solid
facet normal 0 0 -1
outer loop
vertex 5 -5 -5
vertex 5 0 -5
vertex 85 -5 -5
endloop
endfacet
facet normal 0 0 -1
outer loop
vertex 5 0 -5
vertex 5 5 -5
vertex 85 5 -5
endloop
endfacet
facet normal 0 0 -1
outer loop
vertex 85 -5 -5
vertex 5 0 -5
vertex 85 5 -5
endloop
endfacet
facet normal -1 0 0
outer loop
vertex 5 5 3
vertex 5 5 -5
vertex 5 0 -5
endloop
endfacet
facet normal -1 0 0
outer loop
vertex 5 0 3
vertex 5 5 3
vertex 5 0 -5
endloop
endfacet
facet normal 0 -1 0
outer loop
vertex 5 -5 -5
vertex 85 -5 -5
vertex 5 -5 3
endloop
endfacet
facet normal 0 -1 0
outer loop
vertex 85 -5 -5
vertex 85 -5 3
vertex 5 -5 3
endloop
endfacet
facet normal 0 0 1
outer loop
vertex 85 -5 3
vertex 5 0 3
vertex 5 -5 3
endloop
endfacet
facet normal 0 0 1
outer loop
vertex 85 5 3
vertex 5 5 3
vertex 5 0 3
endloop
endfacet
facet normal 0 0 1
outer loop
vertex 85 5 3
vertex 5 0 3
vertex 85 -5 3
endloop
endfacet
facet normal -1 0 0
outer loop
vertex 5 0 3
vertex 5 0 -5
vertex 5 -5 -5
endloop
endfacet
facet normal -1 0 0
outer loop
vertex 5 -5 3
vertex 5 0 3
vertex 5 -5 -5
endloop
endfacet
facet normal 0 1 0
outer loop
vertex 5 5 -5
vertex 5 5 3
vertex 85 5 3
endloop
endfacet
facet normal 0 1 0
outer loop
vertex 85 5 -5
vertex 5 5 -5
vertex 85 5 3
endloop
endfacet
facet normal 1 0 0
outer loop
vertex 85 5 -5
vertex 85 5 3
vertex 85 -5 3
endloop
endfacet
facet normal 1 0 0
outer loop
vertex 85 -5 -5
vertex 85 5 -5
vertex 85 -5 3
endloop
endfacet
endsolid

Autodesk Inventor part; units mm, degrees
ref_plane "YZ Plane" through (0, 0, 0) normal (1, 0, 0) x (0, 1, 0)
sketch "Sketch1" plane through (0, 0, 0) normal (0, 0, 1) x (1, 0, 0)
  line L0 (5, 5) -> (85, 5)
  line L1 (85, 5) -> (85, -5)
  line L2 (85, -5) -> (5, -5)
  arc A0 (5, 5) -> (5, -5) centre (5, 0) ccw construction
  line L3 (0, 7) -> (0, -7) projected
  line L4 (-6, 0) -> (36, 0) projected
  line L5 (5, 5) -> (5, -5)
  dimension "d0" = 5
  dimension "d13" = 80
ref_plane "Work Plane1" through (0, 0, -5) normal (0, 0, 1) x (1, 0, 0)
ref_plane "Work Plane2" through (0, 0, 3) normal (0, 0, 1) x (1, 0, 0)
extrude "Body1" add sketch "Sketch1" against normal up to surface (8 mm away) from surface at 3
equation "\"d0\" = 0.5 * PB"
equation "\"d13\" = NLG"
equation "\"d1\" = -PNT"
equation "\"d2\" = PH - PNT"
equation "\"NLG\" = 80"
equation "\"PNT\" = 5"
equation "\"PH\" = 8"
equation "\"PHH\" = 0"
equation "\"RR\" = 0.001"
equation "\"WDMAX\" = 38"
equation "\"PLB1\" = 85"
equation "\"PUEB\" = 3.3"
equation "\"PB\" = 10"
properties part number "DIN 6885 - B 10 x 8 x 80" material "Steel, Mild"
